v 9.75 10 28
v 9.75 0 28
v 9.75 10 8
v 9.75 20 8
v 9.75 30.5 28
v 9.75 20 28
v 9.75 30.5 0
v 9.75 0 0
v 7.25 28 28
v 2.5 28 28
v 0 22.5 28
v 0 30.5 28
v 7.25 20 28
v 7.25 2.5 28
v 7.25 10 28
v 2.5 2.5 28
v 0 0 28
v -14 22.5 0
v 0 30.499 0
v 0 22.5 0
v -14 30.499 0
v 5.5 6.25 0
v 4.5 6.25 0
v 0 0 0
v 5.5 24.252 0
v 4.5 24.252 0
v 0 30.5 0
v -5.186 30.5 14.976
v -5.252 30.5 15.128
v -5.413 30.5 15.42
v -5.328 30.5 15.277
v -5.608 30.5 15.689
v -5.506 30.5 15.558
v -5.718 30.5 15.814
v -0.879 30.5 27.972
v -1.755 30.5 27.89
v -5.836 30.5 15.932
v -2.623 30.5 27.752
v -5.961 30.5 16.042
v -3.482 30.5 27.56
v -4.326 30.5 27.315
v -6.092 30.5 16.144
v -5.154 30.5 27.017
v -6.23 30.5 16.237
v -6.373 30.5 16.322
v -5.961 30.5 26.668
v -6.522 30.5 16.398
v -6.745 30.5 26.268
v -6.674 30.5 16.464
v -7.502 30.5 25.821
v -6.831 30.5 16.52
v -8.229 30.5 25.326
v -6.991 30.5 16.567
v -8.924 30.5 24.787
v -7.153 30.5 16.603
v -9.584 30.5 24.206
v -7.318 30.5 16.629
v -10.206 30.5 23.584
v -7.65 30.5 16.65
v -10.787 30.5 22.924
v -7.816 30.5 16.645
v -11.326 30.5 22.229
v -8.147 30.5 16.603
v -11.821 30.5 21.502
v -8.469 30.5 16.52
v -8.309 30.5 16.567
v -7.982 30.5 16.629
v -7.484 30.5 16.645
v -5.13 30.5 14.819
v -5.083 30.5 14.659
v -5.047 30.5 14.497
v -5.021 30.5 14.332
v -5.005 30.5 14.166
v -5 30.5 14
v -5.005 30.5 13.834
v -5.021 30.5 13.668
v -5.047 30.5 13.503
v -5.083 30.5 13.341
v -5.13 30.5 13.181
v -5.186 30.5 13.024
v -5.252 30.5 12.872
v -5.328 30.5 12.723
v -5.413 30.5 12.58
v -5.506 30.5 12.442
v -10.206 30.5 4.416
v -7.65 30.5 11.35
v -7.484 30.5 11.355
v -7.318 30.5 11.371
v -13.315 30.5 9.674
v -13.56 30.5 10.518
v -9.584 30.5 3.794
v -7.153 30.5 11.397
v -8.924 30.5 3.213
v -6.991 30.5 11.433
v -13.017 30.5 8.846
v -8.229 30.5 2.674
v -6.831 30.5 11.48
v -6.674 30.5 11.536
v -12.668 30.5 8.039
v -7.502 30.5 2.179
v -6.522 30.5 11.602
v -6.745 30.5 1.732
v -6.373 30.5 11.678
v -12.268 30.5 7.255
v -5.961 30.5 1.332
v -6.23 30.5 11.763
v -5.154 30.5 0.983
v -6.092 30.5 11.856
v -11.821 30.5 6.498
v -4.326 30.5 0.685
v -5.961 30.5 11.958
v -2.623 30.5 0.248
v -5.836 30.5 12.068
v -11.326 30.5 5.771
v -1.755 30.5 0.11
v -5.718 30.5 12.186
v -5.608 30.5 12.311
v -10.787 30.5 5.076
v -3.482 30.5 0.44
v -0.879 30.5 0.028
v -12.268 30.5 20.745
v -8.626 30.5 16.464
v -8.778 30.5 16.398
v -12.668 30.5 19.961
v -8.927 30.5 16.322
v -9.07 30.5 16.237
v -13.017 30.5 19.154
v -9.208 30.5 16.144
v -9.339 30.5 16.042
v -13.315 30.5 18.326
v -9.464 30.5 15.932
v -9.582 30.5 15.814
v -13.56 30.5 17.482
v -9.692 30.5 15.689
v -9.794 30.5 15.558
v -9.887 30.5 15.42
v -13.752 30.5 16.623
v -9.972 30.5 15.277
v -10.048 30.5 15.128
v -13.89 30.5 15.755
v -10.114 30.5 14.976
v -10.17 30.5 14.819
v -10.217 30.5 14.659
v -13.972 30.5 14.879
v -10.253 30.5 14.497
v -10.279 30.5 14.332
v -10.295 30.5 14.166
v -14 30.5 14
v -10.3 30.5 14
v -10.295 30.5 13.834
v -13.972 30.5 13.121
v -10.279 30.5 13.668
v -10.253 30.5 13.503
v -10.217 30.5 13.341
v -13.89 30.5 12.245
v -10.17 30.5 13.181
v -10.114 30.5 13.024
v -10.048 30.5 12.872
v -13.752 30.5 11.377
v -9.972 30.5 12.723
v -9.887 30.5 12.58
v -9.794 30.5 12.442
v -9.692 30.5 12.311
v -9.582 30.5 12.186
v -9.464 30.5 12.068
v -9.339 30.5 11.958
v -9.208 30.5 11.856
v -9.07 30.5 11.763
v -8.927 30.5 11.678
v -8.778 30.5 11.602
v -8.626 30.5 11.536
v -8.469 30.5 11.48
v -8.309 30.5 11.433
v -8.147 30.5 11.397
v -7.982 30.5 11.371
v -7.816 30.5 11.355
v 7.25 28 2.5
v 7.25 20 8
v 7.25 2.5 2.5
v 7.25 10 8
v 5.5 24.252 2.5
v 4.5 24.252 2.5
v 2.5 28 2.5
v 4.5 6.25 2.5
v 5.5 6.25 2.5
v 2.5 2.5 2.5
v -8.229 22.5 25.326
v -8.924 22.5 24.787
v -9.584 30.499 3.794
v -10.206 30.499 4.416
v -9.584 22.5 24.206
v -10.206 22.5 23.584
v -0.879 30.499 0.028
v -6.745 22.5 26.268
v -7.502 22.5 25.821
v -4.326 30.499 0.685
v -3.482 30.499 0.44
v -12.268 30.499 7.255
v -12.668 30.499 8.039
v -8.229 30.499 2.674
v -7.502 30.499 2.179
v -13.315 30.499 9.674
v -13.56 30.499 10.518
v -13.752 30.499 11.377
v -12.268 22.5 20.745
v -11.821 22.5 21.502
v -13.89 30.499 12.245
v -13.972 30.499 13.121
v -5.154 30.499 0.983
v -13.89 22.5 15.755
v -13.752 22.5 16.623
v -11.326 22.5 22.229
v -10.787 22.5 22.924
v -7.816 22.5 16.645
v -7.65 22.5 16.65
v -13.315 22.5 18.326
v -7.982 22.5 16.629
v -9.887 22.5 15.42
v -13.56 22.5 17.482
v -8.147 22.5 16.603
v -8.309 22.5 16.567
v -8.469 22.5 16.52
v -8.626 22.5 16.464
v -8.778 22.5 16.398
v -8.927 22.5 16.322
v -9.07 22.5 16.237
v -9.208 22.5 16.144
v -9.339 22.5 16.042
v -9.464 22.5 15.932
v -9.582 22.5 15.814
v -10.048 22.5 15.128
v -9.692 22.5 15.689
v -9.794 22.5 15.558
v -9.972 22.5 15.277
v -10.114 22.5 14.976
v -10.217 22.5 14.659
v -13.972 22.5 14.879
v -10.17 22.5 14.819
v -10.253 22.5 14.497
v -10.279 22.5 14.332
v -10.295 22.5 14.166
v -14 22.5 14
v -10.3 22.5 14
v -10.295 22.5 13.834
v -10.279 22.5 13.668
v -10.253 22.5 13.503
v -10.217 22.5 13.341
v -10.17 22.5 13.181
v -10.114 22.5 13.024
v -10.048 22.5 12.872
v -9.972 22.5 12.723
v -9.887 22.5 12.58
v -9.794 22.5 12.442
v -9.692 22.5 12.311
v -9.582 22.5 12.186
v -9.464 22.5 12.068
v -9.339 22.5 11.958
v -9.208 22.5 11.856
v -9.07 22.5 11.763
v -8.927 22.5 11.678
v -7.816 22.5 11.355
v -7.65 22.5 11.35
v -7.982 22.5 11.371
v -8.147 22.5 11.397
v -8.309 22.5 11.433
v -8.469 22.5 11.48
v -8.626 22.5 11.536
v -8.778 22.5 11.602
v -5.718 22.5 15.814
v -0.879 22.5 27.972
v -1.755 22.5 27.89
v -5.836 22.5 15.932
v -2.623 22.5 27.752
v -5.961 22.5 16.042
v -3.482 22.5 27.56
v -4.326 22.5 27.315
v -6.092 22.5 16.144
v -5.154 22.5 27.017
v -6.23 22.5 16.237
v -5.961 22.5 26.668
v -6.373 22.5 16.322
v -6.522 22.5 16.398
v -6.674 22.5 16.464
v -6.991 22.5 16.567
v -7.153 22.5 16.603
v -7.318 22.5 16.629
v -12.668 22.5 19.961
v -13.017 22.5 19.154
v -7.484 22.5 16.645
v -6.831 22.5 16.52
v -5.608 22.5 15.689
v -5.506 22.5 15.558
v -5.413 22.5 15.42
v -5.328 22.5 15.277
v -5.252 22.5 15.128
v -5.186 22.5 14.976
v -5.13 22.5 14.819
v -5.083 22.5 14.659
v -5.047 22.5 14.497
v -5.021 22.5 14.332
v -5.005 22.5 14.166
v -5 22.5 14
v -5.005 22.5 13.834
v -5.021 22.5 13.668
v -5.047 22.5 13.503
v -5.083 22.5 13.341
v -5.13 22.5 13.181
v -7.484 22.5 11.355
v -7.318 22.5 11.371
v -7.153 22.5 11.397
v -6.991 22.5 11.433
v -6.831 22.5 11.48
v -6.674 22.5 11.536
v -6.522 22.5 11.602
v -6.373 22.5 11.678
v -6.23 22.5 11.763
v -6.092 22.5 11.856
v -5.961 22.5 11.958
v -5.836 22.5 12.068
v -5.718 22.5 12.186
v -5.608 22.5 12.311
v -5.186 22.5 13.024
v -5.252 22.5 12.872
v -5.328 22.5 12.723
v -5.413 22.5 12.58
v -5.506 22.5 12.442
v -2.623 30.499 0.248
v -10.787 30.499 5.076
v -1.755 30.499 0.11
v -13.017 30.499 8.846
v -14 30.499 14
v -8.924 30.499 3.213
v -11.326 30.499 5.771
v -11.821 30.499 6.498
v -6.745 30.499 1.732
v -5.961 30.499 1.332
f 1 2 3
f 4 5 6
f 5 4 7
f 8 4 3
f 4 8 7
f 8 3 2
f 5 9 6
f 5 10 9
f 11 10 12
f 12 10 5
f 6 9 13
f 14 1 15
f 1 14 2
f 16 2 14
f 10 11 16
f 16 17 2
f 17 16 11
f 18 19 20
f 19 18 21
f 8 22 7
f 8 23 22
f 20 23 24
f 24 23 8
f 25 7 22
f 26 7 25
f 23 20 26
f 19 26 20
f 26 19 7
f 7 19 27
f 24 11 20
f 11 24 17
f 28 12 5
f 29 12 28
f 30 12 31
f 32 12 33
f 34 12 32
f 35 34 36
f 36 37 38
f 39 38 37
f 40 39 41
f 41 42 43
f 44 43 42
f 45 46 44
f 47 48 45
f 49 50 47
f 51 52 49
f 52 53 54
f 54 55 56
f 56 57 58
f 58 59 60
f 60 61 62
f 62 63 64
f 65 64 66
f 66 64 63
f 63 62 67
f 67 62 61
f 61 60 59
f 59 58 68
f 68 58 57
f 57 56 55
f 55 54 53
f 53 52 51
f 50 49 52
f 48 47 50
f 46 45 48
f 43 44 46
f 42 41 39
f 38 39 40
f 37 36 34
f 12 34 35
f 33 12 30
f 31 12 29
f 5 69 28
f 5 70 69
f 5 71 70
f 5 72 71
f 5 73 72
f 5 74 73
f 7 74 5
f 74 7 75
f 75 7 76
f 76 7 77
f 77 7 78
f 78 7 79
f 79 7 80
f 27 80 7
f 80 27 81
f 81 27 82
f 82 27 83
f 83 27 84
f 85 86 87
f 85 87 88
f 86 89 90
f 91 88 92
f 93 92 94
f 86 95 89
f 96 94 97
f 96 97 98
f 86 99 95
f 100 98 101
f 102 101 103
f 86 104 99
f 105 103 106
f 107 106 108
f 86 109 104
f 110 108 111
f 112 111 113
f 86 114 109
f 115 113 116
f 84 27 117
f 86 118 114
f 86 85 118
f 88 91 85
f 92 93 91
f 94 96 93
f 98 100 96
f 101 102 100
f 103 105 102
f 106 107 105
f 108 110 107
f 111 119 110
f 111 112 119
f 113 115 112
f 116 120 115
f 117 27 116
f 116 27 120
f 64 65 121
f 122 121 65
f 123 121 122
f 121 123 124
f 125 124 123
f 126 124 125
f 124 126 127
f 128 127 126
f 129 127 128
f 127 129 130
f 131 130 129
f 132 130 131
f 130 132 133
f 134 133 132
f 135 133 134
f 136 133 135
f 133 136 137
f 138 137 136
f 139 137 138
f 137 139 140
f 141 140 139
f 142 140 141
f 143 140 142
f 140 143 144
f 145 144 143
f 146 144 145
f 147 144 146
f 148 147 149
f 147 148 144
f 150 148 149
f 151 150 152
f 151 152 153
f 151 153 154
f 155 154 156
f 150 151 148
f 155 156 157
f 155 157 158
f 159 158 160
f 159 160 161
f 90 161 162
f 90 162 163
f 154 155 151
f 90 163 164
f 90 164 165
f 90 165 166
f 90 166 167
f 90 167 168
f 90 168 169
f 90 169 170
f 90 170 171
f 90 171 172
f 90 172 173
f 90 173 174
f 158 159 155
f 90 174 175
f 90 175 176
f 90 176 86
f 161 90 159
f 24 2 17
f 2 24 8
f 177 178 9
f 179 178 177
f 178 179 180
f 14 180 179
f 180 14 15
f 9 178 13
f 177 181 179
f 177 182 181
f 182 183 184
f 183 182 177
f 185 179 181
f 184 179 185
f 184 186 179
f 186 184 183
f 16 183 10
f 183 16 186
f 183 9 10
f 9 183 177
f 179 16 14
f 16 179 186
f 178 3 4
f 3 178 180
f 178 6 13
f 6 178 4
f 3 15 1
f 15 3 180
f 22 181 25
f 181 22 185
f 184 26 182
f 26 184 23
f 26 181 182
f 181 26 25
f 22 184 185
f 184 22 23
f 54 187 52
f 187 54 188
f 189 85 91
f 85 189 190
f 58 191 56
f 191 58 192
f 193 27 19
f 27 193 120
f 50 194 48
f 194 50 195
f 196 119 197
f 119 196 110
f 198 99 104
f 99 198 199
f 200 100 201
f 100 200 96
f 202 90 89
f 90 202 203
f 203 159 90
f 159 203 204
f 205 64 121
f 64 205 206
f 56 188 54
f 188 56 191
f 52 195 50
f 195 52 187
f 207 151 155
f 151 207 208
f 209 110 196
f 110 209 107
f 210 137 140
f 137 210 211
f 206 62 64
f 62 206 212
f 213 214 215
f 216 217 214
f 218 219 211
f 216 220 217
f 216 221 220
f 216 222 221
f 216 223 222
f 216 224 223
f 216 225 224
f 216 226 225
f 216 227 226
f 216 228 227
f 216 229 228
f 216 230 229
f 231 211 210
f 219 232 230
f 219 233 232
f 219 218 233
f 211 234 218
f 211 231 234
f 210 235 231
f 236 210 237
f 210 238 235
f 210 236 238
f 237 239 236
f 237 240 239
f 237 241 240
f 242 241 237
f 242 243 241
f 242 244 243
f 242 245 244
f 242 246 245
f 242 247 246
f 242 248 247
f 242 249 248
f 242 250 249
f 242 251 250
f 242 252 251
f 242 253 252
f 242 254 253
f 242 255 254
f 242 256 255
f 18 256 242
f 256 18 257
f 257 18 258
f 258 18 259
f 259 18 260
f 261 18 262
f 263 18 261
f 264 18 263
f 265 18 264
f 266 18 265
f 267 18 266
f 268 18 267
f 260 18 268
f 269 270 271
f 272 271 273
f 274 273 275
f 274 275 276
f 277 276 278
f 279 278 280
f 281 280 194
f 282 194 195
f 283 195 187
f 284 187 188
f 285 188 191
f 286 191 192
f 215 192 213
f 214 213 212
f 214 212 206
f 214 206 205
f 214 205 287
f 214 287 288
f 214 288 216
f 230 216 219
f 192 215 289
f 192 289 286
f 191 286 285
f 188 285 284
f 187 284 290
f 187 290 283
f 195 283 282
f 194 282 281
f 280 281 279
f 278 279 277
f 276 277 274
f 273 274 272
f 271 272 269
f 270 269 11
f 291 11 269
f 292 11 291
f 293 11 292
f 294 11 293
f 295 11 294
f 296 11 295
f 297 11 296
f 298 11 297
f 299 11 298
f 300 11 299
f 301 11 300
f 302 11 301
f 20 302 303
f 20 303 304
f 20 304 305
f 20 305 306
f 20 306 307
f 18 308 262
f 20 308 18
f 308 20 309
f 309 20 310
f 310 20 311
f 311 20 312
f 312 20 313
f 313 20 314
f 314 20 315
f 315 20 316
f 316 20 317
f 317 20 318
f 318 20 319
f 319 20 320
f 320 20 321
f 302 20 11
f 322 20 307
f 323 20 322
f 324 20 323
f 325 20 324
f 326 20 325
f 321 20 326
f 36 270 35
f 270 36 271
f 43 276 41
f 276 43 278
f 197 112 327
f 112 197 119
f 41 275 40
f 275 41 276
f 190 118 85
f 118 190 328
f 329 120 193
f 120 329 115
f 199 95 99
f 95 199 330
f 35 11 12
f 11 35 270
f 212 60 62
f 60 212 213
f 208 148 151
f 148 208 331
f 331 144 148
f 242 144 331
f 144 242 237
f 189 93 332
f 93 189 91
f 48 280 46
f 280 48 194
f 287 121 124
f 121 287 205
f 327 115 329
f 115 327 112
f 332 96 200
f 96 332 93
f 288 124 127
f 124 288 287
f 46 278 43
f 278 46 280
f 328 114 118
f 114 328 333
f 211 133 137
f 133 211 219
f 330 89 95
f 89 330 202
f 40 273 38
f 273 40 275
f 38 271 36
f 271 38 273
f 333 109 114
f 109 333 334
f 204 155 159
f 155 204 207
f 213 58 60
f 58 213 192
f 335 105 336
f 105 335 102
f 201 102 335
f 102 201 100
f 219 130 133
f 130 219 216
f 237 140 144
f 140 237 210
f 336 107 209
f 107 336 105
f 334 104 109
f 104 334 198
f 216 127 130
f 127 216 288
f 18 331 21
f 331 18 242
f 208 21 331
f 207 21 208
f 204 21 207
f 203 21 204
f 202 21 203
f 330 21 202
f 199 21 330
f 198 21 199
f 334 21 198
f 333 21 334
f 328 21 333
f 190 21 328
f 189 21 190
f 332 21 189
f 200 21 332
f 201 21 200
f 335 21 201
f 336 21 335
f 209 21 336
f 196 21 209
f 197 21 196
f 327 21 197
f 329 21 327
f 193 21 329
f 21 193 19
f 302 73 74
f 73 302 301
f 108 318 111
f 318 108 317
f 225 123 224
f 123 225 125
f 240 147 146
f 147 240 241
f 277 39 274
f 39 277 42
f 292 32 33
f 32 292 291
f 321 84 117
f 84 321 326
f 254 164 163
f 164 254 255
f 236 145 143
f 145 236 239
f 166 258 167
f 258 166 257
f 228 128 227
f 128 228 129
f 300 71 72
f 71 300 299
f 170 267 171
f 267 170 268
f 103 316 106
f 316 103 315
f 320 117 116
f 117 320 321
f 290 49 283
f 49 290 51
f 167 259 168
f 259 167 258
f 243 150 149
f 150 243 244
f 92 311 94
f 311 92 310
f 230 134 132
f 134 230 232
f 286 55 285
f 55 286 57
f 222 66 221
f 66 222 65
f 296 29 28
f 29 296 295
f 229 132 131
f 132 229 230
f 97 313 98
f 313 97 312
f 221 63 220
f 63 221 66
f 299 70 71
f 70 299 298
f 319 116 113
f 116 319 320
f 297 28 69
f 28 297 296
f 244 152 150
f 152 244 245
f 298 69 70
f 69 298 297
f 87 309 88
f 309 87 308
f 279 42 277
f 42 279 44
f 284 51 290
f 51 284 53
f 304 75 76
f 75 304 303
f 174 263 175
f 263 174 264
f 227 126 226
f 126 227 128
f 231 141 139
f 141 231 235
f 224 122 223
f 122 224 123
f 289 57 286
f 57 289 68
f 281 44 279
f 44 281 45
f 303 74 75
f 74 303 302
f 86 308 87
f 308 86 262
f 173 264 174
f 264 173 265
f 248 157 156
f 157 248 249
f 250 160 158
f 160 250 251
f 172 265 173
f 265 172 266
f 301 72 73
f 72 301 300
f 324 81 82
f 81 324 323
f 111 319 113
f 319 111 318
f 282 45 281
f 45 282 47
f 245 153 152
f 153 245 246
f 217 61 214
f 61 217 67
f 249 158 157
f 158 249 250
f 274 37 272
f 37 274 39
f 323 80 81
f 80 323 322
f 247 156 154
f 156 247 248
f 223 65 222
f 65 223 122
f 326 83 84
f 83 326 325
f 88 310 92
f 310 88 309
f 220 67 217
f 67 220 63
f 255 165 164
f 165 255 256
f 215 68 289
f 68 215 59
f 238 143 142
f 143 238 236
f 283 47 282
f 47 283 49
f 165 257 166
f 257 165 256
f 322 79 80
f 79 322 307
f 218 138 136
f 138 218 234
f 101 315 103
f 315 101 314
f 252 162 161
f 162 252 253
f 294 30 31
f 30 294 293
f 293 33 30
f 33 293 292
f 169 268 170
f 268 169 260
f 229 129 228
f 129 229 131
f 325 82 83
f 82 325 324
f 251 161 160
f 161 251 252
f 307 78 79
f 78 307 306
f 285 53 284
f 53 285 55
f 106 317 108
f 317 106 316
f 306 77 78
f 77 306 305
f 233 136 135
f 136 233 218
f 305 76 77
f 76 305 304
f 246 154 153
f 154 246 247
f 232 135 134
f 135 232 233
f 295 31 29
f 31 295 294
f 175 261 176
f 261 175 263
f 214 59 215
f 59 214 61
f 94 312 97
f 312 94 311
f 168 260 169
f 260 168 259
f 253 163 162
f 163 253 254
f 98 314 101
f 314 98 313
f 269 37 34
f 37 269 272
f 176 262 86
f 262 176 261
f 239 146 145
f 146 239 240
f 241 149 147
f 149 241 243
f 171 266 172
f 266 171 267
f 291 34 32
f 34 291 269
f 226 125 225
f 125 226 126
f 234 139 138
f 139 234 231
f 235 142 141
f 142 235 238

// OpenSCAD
board_width=25.5;
board_height=23;
board_thick=4.75;
cable_width=18;
cable_thick=1;
side_cover=7.5;
camera_hole_width=10;
camera_hole_height=5.5;
screw_hole_r=2.65;
padding=2.5;
d=0.001;
mount_offset=2*padding+board_width;
mount_thickness=8;

union(){

//camera holder
difference(){
	cube([board_thick+2*padding, board_width+2*padding, board_height+2*padding]);
	//main compartment
	translate([padding, padding, padding]) cube([board_thick, board_width, board_height+padding+d]);
	//front camera slot
	translate([board_thick+padding-d, padding+side_cover, padding+camera_hole_height]) cube([padding+2*d, camera_hole_width, board_height+padding-camera_hole_height+d]);
	//hole for cable in the bottom
	translate([padding+2,padding+(board_width-cable_width)/2,0]) cube([cable_thick, cable_width+2*d, padding+2*d]);
}

//mount
difference(){
	//body of mount
	union(){
		translate([0, mount_offset, board_height/2+padding]) rotate([90,0,0]) cylinder(r=board_height/2+padding, h=mount_thickness, $fn=100);
	translate([-board_height/2-padding,mount_offset-mount_thickness,0]) cube([board_height/2+padding,mount_thickness-d,board_height/2+padding]);
	}
	//remove circle sticking out front
	translate([d,0,0]) cube([50, board_width+2*padding+d, board_height+2*padding+d]);
	//add a hole for the M5 nut
	translate([-screw_hole_r-5,mount_offset, board_height/2+padding]) rotate([90,0,0]) cylinder(r=screw_hole_r, h=mount_thickness+2*d, $fn=100);
}

}
